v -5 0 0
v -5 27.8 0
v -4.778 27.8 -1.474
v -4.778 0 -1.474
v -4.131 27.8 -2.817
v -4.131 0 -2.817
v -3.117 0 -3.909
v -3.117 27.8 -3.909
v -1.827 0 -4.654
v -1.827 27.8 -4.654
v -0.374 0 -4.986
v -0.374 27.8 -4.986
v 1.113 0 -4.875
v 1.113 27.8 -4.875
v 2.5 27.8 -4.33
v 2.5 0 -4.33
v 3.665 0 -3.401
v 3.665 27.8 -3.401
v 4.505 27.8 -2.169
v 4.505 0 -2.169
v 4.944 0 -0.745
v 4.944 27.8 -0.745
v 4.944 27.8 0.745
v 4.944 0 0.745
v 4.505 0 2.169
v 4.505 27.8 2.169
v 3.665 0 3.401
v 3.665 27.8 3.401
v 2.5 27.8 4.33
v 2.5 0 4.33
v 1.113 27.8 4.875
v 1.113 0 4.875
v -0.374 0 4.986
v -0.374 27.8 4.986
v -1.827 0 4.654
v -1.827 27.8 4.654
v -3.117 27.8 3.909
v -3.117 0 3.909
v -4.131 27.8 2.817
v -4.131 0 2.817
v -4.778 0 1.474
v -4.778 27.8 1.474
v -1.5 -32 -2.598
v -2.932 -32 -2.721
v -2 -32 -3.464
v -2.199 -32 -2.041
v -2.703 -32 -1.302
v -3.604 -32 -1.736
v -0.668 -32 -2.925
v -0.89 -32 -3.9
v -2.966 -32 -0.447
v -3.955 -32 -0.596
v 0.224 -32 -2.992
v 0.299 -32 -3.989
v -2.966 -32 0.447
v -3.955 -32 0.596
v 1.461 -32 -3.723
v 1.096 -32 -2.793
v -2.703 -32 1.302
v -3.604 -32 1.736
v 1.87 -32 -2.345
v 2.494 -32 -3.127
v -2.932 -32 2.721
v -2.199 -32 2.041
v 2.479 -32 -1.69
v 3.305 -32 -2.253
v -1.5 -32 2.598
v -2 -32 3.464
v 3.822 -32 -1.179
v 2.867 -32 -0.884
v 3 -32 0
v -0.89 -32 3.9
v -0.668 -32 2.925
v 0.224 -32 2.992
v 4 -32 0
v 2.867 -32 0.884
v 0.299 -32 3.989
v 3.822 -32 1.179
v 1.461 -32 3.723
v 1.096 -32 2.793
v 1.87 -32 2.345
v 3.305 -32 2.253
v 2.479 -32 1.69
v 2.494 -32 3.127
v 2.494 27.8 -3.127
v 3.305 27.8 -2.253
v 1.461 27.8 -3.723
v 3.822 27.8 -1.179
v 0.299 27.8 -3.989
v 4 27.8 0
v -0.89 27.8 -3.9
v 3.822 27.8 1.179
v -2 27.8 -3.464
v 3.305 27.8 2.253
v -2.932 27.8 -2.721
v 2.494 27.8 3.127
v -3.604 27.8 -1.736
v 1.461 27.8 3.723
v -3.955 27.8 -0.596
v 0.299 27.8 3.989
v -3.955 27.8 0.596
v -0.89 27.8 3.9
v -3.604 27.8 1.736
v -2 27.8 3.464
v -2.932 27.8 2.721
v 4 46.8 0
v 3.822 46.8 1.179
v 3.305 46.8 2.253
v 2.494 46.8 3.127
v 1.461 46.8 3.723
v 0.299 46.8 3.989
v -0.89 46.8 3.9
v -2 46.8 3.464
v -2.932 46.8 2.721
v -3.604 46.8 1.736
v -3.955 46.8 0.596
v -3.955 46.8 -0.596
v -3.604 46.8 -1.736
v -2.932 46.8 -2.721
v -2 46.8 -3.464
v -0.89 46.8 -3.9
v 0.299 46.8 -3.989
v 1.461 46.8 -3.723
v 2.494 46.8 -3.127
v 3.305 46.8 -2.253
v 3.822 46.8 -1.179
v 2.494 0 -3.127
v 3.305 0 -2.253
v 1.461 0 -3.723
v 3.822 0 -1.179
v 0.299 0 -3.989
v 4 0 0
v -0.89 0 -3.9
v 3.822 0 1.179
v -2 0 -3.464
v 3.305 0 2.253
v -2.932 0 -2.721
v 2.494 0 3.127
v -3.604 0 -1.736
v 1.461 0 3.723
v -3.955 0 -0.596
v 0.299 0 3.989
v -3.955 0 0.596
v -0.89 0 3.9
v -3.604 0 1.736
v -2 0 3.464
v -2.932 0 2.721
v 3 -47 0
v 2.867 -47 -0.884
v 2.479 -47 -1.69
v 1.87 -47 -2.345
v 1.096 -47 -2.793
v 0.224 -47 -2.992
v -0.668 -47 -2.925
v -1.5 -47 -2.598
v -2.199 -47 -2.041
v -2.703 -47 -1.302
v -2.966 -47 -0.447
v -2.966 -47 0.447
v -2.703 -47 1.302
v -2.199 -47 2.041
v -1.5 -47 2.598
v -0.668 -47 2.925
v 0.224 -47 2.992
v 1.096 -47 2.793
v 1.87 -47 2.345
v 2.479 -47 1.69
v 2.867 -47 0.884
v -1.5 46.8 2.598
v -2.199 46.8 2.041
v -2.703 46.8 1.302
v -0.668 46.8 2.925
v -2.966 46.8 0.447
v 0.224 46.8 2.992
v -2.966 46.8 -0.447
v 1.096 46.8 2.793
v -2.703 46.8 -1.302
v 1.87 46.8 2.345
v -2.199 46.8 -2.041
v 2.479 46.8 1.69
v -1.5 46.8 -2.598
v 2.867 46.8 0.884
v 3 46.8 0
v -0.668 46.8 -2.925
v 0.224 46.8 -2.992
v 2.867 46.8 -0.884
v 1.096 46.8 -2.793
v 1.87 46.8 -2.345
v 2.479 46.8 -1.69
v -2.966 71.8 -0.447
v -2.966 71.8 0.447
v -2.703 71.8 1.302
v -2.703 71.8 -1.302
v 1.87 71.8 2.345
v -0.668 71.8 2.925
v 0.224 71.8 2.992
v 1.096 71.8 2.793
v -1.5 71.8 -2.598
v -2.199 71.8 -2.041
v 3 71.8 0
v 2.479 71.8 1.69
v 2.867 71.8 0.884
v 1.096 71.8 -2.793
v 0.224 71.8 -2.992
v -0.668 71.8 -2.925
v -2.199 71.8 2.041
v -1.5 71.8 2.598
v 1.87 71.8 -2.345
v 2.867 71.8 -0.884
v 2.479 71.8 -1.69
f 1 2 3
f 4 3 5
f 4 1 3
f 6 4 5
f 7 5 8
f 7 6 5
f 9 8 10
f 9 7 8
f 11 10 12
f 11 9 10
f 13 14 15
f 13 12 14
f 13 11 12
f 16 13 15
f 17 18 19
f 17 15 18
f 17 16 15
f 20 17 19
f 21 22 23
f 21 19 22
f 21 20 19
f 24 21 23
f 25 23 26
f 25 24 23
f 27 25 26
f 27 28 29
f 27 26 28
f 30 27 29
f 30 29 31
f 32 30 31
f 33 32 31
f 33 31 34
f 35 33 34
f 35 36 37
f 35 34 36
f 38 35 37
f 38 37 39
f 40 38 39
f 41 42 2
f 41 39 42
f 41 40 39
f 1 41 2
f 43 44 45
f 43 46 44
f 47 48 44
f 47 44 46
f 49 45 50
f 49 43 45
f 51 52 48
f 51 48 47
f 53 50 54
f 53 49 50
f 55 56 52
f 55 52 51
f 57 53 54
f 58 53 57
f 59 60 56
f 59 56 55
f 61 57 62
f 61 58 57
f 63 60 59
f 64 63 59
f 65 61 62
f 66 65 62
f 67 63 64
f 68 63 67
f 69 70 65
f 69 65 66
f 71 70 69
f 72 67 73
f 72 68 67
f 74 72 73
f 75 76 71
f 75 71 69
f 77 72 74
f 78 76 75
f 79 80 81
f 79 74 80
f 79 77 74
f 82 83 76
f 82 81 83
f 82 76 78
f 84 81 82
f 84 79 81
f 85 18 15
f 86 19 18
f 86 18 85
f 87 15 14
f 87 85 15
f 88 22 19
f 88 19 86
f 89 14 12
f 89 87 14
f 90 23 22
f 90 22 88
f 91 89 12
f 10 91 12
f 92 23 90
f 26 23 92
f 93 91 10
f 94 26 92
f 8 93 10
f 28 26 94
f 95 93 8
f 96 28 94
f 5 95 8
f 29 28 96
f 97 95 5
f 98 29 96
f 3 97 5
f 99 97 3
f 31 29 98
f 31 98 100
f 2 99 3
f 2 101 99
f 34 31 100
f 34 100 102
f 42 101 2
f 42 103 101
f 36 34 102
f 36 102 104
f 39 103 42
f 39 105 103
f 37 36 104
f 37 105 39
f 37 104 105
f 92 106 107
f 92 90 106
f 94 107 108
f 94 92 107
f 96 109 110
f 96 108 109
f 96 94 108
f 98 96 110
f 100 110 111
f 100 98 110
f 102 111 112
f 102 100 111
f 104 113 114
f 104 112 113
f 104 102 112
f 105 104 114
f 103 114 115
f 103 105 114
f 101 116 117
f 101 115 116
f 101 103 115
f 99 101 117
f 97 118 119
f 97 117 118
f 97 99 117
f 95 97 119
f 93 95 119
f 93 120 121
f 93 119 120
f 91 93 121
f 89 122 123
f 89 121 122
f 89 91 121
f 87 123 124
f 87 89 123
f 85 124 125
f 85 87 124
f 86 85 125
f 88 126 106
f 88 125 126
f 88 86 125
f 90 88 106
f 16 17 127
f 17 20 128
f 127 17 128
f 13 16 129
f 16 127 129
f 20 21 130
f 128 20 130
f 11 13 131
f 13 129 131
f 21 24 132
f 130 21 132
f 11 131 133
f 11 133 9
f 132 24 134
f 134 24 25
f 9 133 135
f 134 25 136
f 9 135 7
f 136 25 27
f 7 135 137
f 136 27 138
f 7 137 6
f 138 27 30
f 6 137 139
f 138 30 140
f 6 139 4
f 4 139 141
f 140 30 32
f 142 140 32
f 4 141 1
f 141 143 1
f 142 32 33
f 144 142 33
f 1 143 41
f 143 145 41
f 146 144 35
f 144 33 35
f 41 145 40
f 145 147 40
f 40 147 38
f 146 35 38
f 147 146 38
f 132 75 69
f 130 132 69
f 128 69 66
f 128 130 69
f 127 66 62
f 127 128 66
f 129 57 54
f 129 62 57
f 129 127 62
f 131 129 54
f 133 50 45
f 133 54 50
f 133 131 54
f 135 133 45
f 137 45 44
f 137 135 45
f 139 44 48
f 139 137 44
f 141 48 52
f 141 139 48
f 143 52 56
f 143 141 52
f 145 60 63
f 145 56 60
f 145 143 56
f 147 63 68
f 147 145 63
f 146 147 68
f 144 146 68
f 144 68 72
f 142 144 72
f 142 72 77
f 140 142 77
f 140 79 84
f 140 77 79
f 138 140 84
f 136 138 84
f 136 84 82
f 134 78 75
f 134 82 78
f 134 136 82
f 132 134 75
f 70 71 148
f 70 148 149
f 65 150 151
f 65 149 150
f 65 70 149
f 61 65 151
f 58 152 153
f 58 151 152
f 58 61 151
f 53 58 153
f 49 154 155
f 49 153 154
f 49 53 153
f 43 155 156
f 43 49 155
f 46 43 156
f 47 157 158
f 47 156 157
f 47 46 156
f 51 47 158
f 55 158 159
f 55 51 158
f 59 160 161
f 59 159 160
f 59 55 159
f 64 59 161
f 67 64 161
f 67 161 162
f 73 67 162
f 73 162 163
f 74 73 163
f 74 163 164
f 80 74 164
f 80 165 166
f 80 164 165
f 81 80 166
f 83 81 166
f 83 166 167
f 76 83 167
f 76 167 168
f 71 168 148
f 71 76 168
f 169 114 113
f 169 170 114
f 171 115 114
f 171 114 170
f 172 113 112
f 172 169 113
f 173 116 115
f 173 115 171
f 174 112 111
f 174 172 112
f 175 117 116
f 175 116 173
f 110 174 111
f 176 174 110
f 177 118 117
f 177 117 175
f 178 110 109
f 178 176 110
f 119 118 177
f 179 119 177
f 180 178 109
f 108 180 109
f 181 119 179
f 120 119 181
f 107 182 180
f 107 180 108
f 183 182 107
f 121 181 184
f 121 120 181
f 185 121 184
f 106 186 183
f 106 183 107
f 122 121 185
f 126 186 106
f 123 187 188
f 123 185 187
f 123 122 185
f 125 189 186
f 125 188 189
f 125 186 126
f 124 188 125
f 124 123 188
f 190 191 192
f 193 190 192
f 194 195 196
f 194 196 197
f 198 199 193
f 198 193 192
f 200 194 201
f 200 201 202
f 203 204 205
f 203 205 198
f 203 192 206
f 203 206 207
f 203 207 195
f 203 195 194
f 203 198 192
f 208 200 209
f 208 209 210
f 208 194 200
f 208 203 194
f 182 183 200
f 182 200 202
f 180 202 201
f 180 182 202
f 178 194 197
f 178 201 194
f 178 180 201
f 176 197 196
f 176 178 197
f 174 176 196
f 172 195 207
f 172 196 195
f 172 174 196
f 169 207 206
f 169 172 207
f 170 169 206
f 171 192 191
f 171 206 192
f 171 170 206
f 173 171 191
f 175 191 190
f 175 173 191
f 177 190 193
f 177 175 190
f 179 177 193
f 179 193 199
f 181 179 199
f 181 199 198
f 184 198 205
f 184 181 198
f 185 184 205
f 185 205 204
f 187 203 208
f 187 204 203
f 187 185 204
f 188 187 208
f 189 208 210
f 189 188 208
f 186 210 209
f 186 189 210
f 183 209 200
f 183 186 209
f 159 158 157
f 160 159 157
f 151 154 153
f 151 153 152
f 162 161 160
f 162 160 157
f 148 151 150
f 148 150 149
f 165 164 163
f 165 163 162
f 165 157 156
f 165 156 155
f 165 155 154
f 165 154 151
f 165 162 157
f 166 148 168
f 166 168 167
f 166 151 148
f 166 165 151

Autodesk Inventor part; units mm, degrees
ref_plane "YZ Plane" through (0, 0, 0) normal (1, 0, 0) x (0, 1, 0)
ref_plane "XZ Plane" through (0, 0, 0) normal (0, 1, 0) x (-1, 0, 0)
ref_plane "XY Plane" through (0, 0, 0) normal (0, 0, 1) x (1, 0, 0)
sketch "スケッチ1" plane through (0, 0, 0) normal (0, 1, 0) x (-1, 0, 0)
  circle A0 centre (0, 0) radius 5
  dimension "d0" = 10
extrude "押し出し1" add sketch "スケッチ1" along normal blind 27.8
sketch "スケッチ2" plane through (0, 27.8, 0) normal (0, 1, 0) x (1, 0, 0)
  circle A0 centre (0, 0) radius 4
  dimension "d3" = 8
extrude "押し出し2" add sketch "スケッチ2" along normal blind 19
sketch "スケッチ3" plane through (0, 46.8, 0) normal (0, 1, 0) x (1, 0, 0)
  circle A0 centre (0, 0) radius 3
  dimension "d6" = 6
extrude "押し出し3" add sketch "スケッチ3" along normal blind 25
sketch "スケッチ4" plane through (0, 0, 0) normal (0, -1, 0) x (1, 0, 0)
  circle A0 centre (0, 0) radius 4 projected
  circle A1 centre (0, 0) radius 4
  dimension "d9" = 8
extrude "押し出し4" add sketch "スケッチ4" along normal blind 32
sketch "スケッチ5" plane through (0, -32, 0) normal (0, -1, 0) x (1, 0, 0)
  circle A0 centre (0, 0) radius 4 projected
  circle A1 centre (0, 0) radius 3
  dimension "d12" = 6
extrude "押し出し5" add sketch "スケッチ5" along normal blind 15 contours A1
properties part number "shoulder1_shaft2"
